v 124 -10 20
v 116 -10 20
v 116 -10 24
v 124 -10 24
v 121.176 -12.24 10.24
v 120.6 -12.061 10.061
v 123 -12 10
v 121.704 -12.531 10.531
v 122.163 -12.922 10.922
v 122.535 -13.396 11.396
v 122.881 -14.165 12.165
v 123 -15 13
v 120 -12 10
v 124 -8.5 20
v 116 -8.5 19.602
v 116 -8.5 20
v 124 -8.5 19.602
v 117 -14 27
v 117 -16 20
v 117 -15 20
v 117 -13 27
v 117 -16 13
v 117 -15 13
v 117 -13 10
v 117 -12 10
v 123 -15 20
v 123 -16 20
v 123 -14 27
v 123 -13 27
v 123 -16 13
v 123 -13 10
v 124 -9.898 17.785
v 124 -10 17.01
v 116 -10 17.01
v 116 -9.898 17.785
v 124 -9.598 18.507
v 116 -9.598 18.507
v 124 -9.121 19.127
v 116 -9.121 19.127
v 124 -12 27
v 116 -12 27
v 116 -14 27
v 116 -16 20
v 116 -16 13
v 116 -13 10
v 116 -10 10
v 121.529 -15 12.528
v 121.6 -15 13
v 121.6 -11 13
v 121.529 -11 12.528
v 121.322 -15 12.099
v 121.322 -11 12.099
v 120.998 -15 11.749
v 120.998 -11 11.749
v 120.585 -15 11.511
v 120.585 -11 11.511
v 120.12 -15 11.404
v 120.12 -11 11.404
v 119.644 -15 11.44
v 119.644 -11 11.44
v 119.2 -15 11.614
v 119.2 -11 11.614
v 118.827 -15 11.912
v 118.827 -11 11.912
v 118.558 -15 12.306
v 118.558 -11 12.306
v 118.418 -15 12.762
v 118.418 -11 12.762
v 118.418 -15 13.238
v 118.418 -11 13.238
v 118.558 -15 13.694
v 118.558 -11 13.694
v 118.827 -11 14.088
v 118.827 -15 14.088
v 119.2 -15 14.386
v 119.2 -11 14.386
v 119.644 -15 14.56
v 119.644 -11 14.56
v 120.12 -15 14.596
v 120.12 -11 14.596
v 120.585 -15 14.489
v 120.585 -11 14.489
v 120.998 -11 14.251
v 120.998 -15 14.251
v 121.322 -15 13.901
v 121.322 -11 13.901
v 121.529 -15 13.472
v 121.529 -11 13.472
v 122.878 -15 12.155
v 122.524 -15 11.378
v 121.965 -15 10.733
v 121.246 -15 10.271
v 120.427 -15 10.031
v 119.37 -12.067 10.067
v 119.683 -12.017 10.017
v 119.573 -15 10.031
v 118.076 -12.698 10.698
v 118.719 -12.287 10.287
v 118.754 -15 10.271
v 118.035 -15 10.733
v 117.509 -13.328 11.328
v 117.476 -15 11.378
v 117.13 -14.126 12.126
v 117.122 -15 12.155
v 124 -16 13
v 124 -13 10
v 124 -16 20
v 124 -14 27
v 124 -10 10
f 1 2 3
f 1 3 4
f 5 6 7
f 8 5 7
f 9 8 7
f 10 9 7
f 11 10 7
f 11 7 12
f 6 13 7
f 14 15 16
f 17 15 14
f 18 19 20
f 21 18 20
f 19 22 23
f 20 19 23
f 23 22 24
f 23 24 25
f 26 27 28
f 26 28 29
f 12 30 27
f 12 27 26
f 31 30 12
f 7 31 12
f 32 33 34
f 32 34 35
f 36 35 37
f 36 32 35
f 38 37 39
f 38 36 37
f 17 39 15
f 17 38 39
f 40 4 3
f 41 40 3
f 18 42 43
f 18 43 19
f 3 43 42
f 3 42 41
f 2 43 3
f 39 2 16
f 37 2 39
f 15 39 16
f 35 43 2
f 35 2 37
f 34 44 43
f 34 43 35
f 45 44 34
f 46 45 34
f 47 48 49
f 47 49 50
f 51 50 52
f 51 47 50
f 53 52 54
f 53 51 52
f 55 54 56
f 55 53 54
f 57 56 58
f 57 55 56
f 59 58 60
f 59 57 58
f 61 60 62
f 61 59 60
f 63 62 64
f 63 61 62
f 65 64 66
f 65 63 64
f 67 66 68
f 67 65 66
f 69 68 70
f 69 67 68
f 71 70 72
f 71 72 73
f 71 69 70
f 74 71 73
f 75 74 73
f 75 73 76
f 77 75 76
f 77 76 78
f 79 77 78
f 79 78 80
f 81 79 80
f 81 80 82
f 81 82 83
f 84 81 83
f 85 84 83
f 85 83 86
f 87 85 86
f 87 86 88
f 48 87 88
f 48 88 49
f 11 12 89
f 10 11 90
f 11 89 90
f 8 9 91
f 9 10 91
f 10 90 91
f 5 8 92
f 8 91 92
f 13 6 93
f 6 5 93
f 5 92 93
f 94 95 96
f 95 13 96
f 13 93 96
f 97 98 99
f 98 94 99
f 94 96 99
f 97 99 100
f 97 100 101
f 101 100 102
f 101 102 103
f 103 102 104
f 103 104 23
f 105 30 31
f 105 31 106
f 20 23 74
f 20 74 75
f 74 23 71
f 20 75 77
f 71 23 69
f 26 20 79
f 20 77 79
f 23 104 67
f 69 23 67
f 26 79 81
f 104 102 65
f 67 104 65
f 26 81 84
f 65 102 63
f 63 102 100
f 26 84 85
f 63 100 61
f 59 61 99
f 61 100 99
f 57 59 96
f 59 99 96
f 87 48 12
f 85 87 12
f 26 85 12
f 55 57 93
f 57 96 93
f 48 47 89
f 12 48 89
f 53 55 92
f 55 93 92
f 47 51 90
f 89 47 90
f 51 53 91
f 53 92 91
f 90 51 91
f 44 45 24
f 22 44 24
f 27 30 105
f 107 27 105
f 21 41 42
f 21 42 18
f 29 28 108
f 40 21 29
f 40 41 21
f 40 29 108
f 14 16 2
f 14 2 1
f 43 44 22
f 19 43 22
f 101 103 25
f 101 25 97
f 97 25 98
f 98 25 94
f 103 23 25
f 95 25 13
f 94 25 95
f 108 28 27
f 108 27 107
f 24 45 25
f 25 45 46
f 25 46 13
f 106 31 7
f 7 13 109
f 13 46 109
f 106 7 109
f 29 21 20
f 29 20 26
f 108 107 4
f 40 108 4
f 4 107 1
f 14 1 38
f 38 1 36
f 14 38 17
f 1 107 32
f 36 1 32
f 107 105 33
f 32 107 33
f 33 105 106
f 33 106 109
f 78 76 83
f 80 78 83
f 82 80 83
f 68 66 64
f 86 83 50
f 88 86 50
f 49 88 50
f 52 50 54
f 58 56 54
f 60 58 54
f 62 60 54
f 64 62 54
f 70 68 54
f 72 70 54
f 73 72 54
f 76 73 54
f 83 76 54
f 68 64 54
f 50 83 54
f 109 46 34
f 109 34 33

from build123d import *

# Parameters (mm, degrees)
CYLINDER460_R     = 1.6
CYLINDER460_DEPTH = 10
CYLINDER461_R     = 3
CYLINDER461_DEPTH = 3
BOX316_W          = 8
BOX316_H          = 7.5
BOX316_DEPTH      = 17
CHAMFER036_SIZE   = 3
CHAMFER037_SIZE2  = 2
CHAMFER037_SIZE   = 7
BOX317_W          = 6
BOX317_H          = 7.5
BOX317_DEPTH      = 17
BOX314_W          = 10
BOX314_H          = 3
BOX314_DEPTH      = 12
BOX313_W          = 10
BOX313_H          = 3
BOX313_DEPTH      = 12
FILLET112_R       = 2.99
BOX312_W          = 8
BOX312_H          = 7.5
BOX312_DEPTH      = 17
CHAMFER033_SIZE   = 3
CHAMFER034_SIZE2  = 2
CHAMFER034_SIZE   = 7
CHAMFER035_SIZE2  = 3
CHAMFER035_SIZE   = 2


with BuildPart() as cylinder574:
    # Cylinder460 → Cylinder460 (new body)
    with BuildSketch(Plane(origin=(120, -21, 13), x_dir=(1, 0, 0), z_dir=(0, 1, 0))):
        Circle(CYLINDER460_R)
    extrude(amount=CYLINDER460_DEPTH)


with BuildPart() as cylinder575:
    # Cylinder461 → Cylinder461 (new body)
    with BuildSketch(Plane(origin=(120, -15, 13), x_dir=(1, 0, 0), z_dir=(0, 1, 0))):
        Circle(CYLINDER461_R)
    extrude(amount=CYLINDER461_DEPTH)


with BuildPart() as chamfer037:
    # Box316 → Box316 (new body)
    with BuildSketch(Plane(origin=(116, -16, 10), x_dir=(1, 0, 0), z_dir=(0, 0, 1))):
        with Locations((4, 3.75)):
            Rectangle(BOX316_W, BOX316_H)
    extrude(amount=BOX316_DEPTH)

    # Chamfer036
    chamfer036_edges = [chamfer037.edges().sort_by_distance(p)[0] for p in [
        (120, -16, 10),
    ]]
    chamfer(chamfer036_edges, length=CHAMFER036_SIZE)

    # Chamfer037
    chamfer037_edges = [chamfer037.edges().sort_by_distance(p)[0] for p in [
        (120, -16, 27),
    ]]
    chamfer037_side = chamfer037.faces().sort_by_distance((120, -16, 20))[0]
    chamfer(chamfer037_edges, length=CHAMFER037_SIZE, length2=CHAMFER037_SIZE2, reference=chamfer037_side)


with BuildPart() as cut312:
    # Box317 → Box317 (new body)
    with BuildSketch(Plane(origin=(117, -20, 10), x_dir=(1, 0, 0), z_dir=(0, 0, 1))):
        with Locations((3, 3.75)):
            Rectangle(BOX317_W, BOX317_H)
    extrude(amount=BOX317_DEPTH)

    # Cut312: cut Chamfer037
    add(chamfer037.part, mode=Mode.SUBTRACT)


with BuildPart() as cut312_1:
    # Cut312 placement: moved
    add(cut312.part.moved(Location((0, 1, 0))))


with BuildPart() as cube385:
    # Box314 → Box314 (new body)
    with BuildSketch(Plane(origin=(116, -10, 20), x_dir=(1, 0, 0), z_dir=(0, 0, 1))):
        with Locations((5, 1.5)):
            Rectangle(BOX314_W, BOX314_H)
    extrude(amount=BOX314_DEPTH)


with BuildPart() as fillet112:
    # Box313 → Box313 (new body)
    with BuildSketch(Plane(origin=(116, -10, 8), x_dir=(1, 0, 0), z_dir=(0, 0, 1))):
        with Locations((5, 1.5)):
            Rectangle(BOX313_W, BOX313_H)
    extrude(amount=BOX313_DEPTH)

    # Fillet112
    fillet112_edges = [fillet112.edges().sort_by_distance(p)[0] for p in [
        (121, -10, 20),
    ]]
    fillet(fillet112_edges, radius=FILLET112_R)


with BuildPart() as kipper_holder_left:
    # Box312 → Box312 (new body)
    with BuildSketch(Plane(origin=(116, -16, 10), x_dir=(1, 0, 0), z_dir=(0, 0, 1))):
        with Locations((4, 3.75)):
            Rectangle(BOX312_W, BOX312_H)
    extrude(amount=BOX312_DEPTH)

    # Chamfer033
    chamfer033_edges = [kipper_holder_left.edges().sort_by_distance(p)[0] for p in [
        (120, -16, 10),
    ]]
    chamfer(chamfer033_edges, length=CHAMFER033_SIZE)

    # Chamfer034
    chamfer034_edges = [kipper_holder_left.edges().sort_by_distance(p)[0] for p in [
        (120, -16, 27),
    ]]
    chamfer034_side = kipper_holder_left.faces().sort_by_distance((120, -16, 20))[0]
    chamfer(chamfer034_edges, length=CHAMFER034_SIZE, length2=CHAMFER034_SIZE2, reference=chamfer034_side)

    # Cut310: cut Fillet112
    add(fillet112.part, mode=Mode.SUBTRACT)

    # Cut311: cut Cube385
    add(cube385.part, mode=Mode.SUBTRACT)

    # Chamfer035
    chamfer035_edges = [kipper_holder_left.edges().sort_by_distance(p)[0] for p in [
        (120, -10, 27),
    ]]
    chamfer035_side = kipper_holder_left.faces().sort_by_distance((120, -12, 27))[0]
    chamfer(chamfer035_edges, length=CHAMFER035_SIZE, length2=CHAMFER035_SIZE2, reference=chamfer035_side)

    # Cut313: cut Cut312
    add(cut312_1.part, mode=Mode.SUBTRACT)

    # Fusion416: union Cylinder575
    add(cylinder575.part)

    # Cut314: cut Cylinder574
    add(cylinder574.part, mode=Mode.SUBTRACT)


solid = kipper_holder_left.part
